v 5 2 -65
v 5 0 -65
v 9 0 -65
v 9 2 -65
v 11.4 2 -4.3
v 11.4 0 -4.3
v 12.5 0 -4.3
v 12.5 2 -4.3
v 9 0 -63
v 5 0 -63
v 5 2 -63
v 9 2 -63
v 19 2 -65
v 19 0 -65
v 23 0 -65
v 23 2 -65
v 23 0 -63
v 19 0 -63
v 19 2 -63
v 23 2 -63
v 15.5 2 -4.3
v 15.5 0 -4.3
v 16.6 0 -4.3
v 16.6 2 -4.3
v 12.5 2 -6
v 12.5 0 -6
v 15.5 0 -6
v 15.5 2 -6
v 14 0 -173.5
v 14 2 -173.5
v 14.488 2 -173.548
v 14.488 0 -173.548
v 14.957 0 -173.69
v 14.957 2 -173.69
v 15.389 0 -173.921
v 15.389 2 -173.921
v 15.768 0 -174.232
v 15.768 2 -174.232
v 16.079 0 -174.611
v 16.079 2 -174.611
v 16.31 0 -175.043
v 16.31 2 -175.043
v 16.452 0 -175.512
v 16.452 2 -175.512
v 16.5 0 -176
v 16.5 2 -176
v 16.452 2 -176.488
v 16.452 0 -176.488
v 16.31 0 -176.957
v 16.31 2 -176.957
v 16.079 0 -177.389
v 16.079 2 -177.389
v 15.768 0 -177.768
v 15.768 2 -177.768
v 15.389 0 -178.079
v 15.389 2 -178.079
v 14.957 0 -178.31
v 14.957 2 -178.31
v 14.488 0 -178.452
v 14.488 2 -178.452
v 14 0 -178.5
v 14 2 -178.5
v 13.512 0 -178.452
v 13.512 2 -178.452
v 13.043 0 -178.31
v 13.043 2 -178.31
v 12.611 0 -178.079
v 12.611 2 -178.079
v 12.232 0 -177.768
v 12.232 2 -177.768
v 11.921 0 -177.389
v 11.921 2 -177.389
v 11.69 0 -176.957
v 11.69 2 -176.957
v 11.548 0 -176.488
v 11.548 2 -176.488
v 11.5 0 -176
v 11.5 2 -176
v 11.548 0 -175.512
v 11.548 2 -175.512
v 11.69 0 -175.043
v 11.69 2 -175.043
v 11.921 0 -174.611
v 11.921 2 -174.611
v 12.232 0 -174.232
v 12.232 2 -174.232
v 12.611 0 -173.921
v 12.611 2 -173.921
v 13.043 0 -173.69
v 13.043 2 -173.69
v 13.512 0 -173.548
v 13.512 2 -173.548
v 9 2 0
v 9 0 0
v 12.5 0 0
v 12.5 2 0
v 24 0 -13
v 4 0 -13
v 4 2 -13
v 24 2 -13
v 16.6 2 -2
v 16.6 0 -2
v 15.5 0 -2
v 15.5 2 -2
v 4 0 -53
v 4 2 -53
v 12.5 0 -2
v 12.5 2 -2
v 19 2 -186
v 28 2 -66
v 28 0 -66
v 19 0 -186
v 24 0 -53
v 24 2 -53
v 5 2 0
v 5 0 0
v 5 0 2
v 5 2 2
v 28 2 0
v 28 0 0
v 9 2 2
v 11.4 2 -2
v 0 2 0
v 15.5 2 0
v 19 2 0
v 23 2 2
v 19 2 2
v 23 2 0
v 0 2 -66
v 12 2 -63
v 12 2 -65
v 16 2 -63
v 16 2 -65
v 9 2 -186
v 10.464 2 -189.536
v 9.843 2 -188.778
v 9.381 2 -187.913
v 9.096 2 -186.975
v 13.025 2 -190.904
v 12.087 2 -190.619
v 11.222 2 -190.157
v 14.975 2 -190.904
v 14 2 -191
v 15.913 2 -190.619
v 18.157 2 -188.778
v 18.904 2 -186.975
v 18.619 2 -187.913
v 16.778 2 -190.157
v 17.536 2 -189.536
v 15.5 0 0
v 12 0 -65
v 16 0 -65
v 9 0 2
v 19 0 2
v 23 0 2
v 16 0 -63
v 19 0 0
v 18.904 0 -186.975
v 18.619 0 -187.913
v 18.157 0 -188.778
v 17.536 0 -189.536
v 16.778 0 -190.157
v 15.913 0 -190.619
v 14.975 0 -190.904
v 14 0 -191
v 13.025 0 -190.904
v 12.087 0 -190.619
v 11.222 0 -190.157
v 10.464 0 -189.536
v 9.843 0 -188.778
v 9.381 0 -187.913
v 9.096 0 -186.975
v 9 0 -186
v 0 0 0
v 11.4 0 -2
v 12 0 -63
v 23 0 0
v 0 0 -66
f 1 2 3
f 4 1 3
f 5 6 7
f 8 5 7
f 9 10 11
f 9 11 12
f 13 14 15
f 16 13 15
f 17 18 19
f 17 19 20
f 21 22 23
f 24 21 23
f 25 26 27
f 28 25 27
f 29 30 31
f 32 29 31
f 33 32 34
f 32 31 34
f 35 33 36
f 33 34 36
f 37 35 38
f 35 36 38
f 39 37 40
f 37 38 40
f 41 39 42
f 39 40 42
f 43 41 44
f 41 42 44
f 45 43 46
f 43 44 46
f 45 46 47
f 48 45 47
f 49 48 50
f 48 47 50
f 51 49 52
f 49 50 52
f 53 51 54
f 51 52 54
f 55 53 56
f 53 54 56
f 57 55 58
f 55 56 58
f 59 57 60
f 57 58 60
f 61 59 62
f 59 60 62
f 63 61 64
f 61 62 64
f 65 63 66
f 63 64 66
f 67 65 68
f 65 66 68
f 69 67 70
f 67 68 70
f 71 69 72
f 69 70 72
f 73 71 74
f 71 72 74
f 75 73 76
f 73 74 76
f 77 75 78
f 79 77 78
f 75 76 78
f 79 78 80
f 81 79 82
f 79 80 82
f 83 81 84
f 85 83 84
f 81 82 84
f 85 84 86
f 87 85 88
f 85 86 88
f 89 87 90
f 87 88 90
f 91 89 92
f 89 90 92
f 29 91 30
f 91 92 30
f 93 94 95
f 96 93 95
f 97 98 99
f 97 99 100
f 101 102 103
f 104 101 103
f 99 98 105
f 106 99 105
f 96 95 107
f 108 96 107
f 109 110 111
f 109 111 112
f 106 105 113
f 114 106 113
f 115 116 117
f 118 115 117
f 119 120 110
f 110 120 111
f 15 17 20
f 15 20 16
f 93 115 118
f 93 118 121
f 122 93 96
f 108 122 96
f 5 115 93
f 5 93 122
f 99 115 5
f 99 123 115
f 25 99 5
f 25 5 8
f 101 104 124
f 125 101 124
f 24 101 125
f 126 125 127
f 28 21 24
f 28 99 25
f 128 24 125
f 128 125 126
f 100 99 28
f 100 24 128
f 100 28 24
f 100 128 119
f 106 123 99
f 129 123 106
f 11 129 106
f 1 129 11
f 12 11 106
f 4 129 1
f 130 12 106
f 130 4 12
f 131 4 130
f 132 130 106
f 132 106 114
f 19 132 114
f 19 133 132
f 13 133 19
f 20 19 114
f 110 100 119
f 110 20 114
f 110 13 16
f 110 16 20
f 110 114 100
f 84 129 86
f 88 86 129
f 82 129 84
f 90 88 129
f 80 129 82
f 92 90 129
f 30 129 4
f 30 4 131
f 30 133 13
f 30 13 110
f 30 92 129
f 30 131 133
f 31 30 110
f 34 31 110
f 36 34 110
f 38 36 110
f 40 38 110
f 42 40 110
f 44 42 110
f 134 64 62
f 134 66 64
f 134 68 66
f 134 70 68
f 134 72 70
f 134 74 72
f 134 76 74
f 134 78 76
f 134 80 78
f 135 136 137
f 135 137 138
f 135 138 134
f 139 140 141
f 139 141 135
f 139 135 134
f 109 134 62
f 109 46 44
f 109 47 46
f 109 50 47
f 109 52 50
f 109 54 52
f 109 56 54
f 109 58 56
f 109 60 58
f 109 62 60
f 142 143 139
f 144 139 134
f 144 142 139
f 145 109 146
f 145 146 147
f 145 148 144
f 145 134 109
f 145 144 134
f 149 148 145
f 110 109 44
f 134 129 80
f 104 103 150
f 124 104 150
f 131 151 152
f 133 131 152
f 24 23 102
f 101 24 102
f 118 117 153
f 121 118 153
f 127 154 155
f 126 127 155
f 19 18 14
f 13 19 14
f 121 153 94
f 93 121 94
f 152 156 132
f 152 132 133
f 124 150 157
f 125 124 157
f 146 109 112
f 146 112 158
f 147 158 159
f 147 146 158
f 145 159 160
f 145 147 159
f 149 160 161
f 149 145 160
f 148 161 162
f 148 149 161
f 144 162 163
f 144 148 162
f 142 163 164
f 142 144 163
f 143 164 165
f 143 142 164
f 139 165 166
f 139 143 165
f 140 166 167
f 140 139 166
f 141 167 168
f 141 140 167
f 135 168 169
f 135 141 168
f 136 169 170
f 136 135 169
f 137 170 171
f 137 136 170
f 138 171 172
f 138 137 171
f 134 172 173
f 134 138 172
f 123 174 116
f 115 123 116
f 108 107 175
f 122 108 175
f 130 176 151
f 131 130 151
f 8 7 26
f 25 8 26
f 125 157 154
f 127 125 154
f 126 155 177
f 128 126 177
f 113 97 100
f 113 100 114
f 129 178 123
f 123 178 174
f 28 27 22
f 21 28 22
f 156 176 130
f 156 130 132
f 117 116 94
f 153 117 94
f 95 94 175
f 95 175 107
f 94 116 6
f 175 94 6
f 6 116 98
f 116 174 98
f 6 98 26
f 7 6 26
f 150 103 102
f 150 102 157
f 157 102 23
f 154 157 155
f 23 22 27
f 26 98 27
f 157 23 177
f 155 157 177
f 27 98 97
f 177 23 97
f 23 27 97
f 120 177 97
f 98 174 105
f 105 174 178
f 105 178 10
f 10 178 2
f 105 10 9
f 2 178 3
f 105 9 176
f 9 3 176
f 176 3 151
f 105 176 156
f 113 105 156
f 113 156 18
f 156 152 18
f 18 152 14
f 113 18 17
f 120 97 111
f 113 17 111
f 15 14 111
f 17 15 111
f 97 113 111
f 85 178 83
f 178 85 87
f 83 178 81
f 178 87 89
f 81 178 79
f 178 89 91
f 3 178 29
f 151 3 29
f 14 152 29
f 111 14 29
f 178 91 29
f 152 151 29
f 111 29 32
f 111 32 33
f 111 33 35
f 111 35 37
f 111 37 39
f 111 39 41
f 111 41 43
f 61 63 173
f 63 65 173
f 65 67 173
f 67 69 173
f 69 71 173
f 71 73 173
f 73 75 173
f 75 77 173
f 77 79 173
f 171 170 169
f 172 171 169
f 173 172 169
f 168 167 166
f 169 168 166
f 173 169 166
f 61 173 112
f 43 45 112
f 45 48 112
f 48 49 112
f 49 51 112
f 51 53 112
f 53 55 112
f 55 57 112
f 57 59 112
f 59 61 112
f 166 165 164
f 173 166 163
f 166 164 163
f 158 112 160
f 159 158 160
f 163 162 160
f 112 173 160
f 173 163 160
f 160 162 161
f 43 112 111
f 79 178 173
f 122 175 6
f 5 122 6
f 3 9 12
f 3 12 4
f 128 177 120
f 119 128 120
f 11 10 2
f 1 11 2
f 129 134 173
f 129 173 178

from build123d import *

# Parameters (mm, degrees)
SKETCH1_W           = 20
SKETCH1_H           = 40
SKETCH1_W_2         = 4
SKETCH1_H_2         = 2
BOSS_EXTRUDE1_DEPTH = 2
SKETCH2_R           = 2.5
BOSS_EXTRUDE2_DEPTH = 2


with BuildPart() as part:
    # Sketch1 → Boss-Extrude1 (new body)
    with BuildSketch(Plane(origin=(0, 0, 0), x_dir=(1, 0, 0), z_dir=(0, 1, 0))):
        Polygon((0, 0), (5, 0), (5, -2), (9, -2), (9, 0), (12.5, 0), (12.5, 2), (11.4, 2), (11.4, 4.3), (12.5, 4.3), (12.5, 6), (15.5, 6), (15.5, 4.3), (16.6, 4.3), (16.6, 2), (15.5, 2), (15.5, 0), (19, 0), (19, -2), (23, -2), (23, 0), (28, 0), (28, 66), (0, 66), align=None)
        with Locations((14, 33)):
            Rectangle(SKETCH1_W, SKETCH1_H, mode=Mode.SUBTRACT)
        with Locations((7, 64)):
            Rectangle(SKETCH1_W_2, SKETCH1_H_2, mode=Mode.SUBTRACT)
        with Locations((21, 64)):
            Rectangle(SKETCH1_W_2, SKETCH1_H_2, mode=Mode.SUBTRACT)
        with Locations((14, 64)):
            Rectangle(SKETCH1_W_2, SKETCH1_H_2, mode=Mode.SUBTRACT)
    extrude(amount=BOSS_EXTRUDE1_DEPTH)

    # Sketch2 → Boss-Extrude2 (add)
    with BuildSketch(Plane(origin=(0, 2, 0), x_dir=(1, 0, 0), z_dir=(0, 1, 0))):
        with BuildLine():
            Line((28, 66), (19, 186))
            ThreePointArc((19, 186), (14, 191), (9, 186))
            Line((9, 186), (0, 66))
            Line((0, 66), (28, 66))
        make_face()
        with Locations(Location((14, 176, 0), (0, 0, 270))):
            Circle(SKETCH2_R, mode=Mode.SUBTRACT)
    extrude(amount=-BOSS_EXTRUDE2_DEPTH)


solid = part.part
